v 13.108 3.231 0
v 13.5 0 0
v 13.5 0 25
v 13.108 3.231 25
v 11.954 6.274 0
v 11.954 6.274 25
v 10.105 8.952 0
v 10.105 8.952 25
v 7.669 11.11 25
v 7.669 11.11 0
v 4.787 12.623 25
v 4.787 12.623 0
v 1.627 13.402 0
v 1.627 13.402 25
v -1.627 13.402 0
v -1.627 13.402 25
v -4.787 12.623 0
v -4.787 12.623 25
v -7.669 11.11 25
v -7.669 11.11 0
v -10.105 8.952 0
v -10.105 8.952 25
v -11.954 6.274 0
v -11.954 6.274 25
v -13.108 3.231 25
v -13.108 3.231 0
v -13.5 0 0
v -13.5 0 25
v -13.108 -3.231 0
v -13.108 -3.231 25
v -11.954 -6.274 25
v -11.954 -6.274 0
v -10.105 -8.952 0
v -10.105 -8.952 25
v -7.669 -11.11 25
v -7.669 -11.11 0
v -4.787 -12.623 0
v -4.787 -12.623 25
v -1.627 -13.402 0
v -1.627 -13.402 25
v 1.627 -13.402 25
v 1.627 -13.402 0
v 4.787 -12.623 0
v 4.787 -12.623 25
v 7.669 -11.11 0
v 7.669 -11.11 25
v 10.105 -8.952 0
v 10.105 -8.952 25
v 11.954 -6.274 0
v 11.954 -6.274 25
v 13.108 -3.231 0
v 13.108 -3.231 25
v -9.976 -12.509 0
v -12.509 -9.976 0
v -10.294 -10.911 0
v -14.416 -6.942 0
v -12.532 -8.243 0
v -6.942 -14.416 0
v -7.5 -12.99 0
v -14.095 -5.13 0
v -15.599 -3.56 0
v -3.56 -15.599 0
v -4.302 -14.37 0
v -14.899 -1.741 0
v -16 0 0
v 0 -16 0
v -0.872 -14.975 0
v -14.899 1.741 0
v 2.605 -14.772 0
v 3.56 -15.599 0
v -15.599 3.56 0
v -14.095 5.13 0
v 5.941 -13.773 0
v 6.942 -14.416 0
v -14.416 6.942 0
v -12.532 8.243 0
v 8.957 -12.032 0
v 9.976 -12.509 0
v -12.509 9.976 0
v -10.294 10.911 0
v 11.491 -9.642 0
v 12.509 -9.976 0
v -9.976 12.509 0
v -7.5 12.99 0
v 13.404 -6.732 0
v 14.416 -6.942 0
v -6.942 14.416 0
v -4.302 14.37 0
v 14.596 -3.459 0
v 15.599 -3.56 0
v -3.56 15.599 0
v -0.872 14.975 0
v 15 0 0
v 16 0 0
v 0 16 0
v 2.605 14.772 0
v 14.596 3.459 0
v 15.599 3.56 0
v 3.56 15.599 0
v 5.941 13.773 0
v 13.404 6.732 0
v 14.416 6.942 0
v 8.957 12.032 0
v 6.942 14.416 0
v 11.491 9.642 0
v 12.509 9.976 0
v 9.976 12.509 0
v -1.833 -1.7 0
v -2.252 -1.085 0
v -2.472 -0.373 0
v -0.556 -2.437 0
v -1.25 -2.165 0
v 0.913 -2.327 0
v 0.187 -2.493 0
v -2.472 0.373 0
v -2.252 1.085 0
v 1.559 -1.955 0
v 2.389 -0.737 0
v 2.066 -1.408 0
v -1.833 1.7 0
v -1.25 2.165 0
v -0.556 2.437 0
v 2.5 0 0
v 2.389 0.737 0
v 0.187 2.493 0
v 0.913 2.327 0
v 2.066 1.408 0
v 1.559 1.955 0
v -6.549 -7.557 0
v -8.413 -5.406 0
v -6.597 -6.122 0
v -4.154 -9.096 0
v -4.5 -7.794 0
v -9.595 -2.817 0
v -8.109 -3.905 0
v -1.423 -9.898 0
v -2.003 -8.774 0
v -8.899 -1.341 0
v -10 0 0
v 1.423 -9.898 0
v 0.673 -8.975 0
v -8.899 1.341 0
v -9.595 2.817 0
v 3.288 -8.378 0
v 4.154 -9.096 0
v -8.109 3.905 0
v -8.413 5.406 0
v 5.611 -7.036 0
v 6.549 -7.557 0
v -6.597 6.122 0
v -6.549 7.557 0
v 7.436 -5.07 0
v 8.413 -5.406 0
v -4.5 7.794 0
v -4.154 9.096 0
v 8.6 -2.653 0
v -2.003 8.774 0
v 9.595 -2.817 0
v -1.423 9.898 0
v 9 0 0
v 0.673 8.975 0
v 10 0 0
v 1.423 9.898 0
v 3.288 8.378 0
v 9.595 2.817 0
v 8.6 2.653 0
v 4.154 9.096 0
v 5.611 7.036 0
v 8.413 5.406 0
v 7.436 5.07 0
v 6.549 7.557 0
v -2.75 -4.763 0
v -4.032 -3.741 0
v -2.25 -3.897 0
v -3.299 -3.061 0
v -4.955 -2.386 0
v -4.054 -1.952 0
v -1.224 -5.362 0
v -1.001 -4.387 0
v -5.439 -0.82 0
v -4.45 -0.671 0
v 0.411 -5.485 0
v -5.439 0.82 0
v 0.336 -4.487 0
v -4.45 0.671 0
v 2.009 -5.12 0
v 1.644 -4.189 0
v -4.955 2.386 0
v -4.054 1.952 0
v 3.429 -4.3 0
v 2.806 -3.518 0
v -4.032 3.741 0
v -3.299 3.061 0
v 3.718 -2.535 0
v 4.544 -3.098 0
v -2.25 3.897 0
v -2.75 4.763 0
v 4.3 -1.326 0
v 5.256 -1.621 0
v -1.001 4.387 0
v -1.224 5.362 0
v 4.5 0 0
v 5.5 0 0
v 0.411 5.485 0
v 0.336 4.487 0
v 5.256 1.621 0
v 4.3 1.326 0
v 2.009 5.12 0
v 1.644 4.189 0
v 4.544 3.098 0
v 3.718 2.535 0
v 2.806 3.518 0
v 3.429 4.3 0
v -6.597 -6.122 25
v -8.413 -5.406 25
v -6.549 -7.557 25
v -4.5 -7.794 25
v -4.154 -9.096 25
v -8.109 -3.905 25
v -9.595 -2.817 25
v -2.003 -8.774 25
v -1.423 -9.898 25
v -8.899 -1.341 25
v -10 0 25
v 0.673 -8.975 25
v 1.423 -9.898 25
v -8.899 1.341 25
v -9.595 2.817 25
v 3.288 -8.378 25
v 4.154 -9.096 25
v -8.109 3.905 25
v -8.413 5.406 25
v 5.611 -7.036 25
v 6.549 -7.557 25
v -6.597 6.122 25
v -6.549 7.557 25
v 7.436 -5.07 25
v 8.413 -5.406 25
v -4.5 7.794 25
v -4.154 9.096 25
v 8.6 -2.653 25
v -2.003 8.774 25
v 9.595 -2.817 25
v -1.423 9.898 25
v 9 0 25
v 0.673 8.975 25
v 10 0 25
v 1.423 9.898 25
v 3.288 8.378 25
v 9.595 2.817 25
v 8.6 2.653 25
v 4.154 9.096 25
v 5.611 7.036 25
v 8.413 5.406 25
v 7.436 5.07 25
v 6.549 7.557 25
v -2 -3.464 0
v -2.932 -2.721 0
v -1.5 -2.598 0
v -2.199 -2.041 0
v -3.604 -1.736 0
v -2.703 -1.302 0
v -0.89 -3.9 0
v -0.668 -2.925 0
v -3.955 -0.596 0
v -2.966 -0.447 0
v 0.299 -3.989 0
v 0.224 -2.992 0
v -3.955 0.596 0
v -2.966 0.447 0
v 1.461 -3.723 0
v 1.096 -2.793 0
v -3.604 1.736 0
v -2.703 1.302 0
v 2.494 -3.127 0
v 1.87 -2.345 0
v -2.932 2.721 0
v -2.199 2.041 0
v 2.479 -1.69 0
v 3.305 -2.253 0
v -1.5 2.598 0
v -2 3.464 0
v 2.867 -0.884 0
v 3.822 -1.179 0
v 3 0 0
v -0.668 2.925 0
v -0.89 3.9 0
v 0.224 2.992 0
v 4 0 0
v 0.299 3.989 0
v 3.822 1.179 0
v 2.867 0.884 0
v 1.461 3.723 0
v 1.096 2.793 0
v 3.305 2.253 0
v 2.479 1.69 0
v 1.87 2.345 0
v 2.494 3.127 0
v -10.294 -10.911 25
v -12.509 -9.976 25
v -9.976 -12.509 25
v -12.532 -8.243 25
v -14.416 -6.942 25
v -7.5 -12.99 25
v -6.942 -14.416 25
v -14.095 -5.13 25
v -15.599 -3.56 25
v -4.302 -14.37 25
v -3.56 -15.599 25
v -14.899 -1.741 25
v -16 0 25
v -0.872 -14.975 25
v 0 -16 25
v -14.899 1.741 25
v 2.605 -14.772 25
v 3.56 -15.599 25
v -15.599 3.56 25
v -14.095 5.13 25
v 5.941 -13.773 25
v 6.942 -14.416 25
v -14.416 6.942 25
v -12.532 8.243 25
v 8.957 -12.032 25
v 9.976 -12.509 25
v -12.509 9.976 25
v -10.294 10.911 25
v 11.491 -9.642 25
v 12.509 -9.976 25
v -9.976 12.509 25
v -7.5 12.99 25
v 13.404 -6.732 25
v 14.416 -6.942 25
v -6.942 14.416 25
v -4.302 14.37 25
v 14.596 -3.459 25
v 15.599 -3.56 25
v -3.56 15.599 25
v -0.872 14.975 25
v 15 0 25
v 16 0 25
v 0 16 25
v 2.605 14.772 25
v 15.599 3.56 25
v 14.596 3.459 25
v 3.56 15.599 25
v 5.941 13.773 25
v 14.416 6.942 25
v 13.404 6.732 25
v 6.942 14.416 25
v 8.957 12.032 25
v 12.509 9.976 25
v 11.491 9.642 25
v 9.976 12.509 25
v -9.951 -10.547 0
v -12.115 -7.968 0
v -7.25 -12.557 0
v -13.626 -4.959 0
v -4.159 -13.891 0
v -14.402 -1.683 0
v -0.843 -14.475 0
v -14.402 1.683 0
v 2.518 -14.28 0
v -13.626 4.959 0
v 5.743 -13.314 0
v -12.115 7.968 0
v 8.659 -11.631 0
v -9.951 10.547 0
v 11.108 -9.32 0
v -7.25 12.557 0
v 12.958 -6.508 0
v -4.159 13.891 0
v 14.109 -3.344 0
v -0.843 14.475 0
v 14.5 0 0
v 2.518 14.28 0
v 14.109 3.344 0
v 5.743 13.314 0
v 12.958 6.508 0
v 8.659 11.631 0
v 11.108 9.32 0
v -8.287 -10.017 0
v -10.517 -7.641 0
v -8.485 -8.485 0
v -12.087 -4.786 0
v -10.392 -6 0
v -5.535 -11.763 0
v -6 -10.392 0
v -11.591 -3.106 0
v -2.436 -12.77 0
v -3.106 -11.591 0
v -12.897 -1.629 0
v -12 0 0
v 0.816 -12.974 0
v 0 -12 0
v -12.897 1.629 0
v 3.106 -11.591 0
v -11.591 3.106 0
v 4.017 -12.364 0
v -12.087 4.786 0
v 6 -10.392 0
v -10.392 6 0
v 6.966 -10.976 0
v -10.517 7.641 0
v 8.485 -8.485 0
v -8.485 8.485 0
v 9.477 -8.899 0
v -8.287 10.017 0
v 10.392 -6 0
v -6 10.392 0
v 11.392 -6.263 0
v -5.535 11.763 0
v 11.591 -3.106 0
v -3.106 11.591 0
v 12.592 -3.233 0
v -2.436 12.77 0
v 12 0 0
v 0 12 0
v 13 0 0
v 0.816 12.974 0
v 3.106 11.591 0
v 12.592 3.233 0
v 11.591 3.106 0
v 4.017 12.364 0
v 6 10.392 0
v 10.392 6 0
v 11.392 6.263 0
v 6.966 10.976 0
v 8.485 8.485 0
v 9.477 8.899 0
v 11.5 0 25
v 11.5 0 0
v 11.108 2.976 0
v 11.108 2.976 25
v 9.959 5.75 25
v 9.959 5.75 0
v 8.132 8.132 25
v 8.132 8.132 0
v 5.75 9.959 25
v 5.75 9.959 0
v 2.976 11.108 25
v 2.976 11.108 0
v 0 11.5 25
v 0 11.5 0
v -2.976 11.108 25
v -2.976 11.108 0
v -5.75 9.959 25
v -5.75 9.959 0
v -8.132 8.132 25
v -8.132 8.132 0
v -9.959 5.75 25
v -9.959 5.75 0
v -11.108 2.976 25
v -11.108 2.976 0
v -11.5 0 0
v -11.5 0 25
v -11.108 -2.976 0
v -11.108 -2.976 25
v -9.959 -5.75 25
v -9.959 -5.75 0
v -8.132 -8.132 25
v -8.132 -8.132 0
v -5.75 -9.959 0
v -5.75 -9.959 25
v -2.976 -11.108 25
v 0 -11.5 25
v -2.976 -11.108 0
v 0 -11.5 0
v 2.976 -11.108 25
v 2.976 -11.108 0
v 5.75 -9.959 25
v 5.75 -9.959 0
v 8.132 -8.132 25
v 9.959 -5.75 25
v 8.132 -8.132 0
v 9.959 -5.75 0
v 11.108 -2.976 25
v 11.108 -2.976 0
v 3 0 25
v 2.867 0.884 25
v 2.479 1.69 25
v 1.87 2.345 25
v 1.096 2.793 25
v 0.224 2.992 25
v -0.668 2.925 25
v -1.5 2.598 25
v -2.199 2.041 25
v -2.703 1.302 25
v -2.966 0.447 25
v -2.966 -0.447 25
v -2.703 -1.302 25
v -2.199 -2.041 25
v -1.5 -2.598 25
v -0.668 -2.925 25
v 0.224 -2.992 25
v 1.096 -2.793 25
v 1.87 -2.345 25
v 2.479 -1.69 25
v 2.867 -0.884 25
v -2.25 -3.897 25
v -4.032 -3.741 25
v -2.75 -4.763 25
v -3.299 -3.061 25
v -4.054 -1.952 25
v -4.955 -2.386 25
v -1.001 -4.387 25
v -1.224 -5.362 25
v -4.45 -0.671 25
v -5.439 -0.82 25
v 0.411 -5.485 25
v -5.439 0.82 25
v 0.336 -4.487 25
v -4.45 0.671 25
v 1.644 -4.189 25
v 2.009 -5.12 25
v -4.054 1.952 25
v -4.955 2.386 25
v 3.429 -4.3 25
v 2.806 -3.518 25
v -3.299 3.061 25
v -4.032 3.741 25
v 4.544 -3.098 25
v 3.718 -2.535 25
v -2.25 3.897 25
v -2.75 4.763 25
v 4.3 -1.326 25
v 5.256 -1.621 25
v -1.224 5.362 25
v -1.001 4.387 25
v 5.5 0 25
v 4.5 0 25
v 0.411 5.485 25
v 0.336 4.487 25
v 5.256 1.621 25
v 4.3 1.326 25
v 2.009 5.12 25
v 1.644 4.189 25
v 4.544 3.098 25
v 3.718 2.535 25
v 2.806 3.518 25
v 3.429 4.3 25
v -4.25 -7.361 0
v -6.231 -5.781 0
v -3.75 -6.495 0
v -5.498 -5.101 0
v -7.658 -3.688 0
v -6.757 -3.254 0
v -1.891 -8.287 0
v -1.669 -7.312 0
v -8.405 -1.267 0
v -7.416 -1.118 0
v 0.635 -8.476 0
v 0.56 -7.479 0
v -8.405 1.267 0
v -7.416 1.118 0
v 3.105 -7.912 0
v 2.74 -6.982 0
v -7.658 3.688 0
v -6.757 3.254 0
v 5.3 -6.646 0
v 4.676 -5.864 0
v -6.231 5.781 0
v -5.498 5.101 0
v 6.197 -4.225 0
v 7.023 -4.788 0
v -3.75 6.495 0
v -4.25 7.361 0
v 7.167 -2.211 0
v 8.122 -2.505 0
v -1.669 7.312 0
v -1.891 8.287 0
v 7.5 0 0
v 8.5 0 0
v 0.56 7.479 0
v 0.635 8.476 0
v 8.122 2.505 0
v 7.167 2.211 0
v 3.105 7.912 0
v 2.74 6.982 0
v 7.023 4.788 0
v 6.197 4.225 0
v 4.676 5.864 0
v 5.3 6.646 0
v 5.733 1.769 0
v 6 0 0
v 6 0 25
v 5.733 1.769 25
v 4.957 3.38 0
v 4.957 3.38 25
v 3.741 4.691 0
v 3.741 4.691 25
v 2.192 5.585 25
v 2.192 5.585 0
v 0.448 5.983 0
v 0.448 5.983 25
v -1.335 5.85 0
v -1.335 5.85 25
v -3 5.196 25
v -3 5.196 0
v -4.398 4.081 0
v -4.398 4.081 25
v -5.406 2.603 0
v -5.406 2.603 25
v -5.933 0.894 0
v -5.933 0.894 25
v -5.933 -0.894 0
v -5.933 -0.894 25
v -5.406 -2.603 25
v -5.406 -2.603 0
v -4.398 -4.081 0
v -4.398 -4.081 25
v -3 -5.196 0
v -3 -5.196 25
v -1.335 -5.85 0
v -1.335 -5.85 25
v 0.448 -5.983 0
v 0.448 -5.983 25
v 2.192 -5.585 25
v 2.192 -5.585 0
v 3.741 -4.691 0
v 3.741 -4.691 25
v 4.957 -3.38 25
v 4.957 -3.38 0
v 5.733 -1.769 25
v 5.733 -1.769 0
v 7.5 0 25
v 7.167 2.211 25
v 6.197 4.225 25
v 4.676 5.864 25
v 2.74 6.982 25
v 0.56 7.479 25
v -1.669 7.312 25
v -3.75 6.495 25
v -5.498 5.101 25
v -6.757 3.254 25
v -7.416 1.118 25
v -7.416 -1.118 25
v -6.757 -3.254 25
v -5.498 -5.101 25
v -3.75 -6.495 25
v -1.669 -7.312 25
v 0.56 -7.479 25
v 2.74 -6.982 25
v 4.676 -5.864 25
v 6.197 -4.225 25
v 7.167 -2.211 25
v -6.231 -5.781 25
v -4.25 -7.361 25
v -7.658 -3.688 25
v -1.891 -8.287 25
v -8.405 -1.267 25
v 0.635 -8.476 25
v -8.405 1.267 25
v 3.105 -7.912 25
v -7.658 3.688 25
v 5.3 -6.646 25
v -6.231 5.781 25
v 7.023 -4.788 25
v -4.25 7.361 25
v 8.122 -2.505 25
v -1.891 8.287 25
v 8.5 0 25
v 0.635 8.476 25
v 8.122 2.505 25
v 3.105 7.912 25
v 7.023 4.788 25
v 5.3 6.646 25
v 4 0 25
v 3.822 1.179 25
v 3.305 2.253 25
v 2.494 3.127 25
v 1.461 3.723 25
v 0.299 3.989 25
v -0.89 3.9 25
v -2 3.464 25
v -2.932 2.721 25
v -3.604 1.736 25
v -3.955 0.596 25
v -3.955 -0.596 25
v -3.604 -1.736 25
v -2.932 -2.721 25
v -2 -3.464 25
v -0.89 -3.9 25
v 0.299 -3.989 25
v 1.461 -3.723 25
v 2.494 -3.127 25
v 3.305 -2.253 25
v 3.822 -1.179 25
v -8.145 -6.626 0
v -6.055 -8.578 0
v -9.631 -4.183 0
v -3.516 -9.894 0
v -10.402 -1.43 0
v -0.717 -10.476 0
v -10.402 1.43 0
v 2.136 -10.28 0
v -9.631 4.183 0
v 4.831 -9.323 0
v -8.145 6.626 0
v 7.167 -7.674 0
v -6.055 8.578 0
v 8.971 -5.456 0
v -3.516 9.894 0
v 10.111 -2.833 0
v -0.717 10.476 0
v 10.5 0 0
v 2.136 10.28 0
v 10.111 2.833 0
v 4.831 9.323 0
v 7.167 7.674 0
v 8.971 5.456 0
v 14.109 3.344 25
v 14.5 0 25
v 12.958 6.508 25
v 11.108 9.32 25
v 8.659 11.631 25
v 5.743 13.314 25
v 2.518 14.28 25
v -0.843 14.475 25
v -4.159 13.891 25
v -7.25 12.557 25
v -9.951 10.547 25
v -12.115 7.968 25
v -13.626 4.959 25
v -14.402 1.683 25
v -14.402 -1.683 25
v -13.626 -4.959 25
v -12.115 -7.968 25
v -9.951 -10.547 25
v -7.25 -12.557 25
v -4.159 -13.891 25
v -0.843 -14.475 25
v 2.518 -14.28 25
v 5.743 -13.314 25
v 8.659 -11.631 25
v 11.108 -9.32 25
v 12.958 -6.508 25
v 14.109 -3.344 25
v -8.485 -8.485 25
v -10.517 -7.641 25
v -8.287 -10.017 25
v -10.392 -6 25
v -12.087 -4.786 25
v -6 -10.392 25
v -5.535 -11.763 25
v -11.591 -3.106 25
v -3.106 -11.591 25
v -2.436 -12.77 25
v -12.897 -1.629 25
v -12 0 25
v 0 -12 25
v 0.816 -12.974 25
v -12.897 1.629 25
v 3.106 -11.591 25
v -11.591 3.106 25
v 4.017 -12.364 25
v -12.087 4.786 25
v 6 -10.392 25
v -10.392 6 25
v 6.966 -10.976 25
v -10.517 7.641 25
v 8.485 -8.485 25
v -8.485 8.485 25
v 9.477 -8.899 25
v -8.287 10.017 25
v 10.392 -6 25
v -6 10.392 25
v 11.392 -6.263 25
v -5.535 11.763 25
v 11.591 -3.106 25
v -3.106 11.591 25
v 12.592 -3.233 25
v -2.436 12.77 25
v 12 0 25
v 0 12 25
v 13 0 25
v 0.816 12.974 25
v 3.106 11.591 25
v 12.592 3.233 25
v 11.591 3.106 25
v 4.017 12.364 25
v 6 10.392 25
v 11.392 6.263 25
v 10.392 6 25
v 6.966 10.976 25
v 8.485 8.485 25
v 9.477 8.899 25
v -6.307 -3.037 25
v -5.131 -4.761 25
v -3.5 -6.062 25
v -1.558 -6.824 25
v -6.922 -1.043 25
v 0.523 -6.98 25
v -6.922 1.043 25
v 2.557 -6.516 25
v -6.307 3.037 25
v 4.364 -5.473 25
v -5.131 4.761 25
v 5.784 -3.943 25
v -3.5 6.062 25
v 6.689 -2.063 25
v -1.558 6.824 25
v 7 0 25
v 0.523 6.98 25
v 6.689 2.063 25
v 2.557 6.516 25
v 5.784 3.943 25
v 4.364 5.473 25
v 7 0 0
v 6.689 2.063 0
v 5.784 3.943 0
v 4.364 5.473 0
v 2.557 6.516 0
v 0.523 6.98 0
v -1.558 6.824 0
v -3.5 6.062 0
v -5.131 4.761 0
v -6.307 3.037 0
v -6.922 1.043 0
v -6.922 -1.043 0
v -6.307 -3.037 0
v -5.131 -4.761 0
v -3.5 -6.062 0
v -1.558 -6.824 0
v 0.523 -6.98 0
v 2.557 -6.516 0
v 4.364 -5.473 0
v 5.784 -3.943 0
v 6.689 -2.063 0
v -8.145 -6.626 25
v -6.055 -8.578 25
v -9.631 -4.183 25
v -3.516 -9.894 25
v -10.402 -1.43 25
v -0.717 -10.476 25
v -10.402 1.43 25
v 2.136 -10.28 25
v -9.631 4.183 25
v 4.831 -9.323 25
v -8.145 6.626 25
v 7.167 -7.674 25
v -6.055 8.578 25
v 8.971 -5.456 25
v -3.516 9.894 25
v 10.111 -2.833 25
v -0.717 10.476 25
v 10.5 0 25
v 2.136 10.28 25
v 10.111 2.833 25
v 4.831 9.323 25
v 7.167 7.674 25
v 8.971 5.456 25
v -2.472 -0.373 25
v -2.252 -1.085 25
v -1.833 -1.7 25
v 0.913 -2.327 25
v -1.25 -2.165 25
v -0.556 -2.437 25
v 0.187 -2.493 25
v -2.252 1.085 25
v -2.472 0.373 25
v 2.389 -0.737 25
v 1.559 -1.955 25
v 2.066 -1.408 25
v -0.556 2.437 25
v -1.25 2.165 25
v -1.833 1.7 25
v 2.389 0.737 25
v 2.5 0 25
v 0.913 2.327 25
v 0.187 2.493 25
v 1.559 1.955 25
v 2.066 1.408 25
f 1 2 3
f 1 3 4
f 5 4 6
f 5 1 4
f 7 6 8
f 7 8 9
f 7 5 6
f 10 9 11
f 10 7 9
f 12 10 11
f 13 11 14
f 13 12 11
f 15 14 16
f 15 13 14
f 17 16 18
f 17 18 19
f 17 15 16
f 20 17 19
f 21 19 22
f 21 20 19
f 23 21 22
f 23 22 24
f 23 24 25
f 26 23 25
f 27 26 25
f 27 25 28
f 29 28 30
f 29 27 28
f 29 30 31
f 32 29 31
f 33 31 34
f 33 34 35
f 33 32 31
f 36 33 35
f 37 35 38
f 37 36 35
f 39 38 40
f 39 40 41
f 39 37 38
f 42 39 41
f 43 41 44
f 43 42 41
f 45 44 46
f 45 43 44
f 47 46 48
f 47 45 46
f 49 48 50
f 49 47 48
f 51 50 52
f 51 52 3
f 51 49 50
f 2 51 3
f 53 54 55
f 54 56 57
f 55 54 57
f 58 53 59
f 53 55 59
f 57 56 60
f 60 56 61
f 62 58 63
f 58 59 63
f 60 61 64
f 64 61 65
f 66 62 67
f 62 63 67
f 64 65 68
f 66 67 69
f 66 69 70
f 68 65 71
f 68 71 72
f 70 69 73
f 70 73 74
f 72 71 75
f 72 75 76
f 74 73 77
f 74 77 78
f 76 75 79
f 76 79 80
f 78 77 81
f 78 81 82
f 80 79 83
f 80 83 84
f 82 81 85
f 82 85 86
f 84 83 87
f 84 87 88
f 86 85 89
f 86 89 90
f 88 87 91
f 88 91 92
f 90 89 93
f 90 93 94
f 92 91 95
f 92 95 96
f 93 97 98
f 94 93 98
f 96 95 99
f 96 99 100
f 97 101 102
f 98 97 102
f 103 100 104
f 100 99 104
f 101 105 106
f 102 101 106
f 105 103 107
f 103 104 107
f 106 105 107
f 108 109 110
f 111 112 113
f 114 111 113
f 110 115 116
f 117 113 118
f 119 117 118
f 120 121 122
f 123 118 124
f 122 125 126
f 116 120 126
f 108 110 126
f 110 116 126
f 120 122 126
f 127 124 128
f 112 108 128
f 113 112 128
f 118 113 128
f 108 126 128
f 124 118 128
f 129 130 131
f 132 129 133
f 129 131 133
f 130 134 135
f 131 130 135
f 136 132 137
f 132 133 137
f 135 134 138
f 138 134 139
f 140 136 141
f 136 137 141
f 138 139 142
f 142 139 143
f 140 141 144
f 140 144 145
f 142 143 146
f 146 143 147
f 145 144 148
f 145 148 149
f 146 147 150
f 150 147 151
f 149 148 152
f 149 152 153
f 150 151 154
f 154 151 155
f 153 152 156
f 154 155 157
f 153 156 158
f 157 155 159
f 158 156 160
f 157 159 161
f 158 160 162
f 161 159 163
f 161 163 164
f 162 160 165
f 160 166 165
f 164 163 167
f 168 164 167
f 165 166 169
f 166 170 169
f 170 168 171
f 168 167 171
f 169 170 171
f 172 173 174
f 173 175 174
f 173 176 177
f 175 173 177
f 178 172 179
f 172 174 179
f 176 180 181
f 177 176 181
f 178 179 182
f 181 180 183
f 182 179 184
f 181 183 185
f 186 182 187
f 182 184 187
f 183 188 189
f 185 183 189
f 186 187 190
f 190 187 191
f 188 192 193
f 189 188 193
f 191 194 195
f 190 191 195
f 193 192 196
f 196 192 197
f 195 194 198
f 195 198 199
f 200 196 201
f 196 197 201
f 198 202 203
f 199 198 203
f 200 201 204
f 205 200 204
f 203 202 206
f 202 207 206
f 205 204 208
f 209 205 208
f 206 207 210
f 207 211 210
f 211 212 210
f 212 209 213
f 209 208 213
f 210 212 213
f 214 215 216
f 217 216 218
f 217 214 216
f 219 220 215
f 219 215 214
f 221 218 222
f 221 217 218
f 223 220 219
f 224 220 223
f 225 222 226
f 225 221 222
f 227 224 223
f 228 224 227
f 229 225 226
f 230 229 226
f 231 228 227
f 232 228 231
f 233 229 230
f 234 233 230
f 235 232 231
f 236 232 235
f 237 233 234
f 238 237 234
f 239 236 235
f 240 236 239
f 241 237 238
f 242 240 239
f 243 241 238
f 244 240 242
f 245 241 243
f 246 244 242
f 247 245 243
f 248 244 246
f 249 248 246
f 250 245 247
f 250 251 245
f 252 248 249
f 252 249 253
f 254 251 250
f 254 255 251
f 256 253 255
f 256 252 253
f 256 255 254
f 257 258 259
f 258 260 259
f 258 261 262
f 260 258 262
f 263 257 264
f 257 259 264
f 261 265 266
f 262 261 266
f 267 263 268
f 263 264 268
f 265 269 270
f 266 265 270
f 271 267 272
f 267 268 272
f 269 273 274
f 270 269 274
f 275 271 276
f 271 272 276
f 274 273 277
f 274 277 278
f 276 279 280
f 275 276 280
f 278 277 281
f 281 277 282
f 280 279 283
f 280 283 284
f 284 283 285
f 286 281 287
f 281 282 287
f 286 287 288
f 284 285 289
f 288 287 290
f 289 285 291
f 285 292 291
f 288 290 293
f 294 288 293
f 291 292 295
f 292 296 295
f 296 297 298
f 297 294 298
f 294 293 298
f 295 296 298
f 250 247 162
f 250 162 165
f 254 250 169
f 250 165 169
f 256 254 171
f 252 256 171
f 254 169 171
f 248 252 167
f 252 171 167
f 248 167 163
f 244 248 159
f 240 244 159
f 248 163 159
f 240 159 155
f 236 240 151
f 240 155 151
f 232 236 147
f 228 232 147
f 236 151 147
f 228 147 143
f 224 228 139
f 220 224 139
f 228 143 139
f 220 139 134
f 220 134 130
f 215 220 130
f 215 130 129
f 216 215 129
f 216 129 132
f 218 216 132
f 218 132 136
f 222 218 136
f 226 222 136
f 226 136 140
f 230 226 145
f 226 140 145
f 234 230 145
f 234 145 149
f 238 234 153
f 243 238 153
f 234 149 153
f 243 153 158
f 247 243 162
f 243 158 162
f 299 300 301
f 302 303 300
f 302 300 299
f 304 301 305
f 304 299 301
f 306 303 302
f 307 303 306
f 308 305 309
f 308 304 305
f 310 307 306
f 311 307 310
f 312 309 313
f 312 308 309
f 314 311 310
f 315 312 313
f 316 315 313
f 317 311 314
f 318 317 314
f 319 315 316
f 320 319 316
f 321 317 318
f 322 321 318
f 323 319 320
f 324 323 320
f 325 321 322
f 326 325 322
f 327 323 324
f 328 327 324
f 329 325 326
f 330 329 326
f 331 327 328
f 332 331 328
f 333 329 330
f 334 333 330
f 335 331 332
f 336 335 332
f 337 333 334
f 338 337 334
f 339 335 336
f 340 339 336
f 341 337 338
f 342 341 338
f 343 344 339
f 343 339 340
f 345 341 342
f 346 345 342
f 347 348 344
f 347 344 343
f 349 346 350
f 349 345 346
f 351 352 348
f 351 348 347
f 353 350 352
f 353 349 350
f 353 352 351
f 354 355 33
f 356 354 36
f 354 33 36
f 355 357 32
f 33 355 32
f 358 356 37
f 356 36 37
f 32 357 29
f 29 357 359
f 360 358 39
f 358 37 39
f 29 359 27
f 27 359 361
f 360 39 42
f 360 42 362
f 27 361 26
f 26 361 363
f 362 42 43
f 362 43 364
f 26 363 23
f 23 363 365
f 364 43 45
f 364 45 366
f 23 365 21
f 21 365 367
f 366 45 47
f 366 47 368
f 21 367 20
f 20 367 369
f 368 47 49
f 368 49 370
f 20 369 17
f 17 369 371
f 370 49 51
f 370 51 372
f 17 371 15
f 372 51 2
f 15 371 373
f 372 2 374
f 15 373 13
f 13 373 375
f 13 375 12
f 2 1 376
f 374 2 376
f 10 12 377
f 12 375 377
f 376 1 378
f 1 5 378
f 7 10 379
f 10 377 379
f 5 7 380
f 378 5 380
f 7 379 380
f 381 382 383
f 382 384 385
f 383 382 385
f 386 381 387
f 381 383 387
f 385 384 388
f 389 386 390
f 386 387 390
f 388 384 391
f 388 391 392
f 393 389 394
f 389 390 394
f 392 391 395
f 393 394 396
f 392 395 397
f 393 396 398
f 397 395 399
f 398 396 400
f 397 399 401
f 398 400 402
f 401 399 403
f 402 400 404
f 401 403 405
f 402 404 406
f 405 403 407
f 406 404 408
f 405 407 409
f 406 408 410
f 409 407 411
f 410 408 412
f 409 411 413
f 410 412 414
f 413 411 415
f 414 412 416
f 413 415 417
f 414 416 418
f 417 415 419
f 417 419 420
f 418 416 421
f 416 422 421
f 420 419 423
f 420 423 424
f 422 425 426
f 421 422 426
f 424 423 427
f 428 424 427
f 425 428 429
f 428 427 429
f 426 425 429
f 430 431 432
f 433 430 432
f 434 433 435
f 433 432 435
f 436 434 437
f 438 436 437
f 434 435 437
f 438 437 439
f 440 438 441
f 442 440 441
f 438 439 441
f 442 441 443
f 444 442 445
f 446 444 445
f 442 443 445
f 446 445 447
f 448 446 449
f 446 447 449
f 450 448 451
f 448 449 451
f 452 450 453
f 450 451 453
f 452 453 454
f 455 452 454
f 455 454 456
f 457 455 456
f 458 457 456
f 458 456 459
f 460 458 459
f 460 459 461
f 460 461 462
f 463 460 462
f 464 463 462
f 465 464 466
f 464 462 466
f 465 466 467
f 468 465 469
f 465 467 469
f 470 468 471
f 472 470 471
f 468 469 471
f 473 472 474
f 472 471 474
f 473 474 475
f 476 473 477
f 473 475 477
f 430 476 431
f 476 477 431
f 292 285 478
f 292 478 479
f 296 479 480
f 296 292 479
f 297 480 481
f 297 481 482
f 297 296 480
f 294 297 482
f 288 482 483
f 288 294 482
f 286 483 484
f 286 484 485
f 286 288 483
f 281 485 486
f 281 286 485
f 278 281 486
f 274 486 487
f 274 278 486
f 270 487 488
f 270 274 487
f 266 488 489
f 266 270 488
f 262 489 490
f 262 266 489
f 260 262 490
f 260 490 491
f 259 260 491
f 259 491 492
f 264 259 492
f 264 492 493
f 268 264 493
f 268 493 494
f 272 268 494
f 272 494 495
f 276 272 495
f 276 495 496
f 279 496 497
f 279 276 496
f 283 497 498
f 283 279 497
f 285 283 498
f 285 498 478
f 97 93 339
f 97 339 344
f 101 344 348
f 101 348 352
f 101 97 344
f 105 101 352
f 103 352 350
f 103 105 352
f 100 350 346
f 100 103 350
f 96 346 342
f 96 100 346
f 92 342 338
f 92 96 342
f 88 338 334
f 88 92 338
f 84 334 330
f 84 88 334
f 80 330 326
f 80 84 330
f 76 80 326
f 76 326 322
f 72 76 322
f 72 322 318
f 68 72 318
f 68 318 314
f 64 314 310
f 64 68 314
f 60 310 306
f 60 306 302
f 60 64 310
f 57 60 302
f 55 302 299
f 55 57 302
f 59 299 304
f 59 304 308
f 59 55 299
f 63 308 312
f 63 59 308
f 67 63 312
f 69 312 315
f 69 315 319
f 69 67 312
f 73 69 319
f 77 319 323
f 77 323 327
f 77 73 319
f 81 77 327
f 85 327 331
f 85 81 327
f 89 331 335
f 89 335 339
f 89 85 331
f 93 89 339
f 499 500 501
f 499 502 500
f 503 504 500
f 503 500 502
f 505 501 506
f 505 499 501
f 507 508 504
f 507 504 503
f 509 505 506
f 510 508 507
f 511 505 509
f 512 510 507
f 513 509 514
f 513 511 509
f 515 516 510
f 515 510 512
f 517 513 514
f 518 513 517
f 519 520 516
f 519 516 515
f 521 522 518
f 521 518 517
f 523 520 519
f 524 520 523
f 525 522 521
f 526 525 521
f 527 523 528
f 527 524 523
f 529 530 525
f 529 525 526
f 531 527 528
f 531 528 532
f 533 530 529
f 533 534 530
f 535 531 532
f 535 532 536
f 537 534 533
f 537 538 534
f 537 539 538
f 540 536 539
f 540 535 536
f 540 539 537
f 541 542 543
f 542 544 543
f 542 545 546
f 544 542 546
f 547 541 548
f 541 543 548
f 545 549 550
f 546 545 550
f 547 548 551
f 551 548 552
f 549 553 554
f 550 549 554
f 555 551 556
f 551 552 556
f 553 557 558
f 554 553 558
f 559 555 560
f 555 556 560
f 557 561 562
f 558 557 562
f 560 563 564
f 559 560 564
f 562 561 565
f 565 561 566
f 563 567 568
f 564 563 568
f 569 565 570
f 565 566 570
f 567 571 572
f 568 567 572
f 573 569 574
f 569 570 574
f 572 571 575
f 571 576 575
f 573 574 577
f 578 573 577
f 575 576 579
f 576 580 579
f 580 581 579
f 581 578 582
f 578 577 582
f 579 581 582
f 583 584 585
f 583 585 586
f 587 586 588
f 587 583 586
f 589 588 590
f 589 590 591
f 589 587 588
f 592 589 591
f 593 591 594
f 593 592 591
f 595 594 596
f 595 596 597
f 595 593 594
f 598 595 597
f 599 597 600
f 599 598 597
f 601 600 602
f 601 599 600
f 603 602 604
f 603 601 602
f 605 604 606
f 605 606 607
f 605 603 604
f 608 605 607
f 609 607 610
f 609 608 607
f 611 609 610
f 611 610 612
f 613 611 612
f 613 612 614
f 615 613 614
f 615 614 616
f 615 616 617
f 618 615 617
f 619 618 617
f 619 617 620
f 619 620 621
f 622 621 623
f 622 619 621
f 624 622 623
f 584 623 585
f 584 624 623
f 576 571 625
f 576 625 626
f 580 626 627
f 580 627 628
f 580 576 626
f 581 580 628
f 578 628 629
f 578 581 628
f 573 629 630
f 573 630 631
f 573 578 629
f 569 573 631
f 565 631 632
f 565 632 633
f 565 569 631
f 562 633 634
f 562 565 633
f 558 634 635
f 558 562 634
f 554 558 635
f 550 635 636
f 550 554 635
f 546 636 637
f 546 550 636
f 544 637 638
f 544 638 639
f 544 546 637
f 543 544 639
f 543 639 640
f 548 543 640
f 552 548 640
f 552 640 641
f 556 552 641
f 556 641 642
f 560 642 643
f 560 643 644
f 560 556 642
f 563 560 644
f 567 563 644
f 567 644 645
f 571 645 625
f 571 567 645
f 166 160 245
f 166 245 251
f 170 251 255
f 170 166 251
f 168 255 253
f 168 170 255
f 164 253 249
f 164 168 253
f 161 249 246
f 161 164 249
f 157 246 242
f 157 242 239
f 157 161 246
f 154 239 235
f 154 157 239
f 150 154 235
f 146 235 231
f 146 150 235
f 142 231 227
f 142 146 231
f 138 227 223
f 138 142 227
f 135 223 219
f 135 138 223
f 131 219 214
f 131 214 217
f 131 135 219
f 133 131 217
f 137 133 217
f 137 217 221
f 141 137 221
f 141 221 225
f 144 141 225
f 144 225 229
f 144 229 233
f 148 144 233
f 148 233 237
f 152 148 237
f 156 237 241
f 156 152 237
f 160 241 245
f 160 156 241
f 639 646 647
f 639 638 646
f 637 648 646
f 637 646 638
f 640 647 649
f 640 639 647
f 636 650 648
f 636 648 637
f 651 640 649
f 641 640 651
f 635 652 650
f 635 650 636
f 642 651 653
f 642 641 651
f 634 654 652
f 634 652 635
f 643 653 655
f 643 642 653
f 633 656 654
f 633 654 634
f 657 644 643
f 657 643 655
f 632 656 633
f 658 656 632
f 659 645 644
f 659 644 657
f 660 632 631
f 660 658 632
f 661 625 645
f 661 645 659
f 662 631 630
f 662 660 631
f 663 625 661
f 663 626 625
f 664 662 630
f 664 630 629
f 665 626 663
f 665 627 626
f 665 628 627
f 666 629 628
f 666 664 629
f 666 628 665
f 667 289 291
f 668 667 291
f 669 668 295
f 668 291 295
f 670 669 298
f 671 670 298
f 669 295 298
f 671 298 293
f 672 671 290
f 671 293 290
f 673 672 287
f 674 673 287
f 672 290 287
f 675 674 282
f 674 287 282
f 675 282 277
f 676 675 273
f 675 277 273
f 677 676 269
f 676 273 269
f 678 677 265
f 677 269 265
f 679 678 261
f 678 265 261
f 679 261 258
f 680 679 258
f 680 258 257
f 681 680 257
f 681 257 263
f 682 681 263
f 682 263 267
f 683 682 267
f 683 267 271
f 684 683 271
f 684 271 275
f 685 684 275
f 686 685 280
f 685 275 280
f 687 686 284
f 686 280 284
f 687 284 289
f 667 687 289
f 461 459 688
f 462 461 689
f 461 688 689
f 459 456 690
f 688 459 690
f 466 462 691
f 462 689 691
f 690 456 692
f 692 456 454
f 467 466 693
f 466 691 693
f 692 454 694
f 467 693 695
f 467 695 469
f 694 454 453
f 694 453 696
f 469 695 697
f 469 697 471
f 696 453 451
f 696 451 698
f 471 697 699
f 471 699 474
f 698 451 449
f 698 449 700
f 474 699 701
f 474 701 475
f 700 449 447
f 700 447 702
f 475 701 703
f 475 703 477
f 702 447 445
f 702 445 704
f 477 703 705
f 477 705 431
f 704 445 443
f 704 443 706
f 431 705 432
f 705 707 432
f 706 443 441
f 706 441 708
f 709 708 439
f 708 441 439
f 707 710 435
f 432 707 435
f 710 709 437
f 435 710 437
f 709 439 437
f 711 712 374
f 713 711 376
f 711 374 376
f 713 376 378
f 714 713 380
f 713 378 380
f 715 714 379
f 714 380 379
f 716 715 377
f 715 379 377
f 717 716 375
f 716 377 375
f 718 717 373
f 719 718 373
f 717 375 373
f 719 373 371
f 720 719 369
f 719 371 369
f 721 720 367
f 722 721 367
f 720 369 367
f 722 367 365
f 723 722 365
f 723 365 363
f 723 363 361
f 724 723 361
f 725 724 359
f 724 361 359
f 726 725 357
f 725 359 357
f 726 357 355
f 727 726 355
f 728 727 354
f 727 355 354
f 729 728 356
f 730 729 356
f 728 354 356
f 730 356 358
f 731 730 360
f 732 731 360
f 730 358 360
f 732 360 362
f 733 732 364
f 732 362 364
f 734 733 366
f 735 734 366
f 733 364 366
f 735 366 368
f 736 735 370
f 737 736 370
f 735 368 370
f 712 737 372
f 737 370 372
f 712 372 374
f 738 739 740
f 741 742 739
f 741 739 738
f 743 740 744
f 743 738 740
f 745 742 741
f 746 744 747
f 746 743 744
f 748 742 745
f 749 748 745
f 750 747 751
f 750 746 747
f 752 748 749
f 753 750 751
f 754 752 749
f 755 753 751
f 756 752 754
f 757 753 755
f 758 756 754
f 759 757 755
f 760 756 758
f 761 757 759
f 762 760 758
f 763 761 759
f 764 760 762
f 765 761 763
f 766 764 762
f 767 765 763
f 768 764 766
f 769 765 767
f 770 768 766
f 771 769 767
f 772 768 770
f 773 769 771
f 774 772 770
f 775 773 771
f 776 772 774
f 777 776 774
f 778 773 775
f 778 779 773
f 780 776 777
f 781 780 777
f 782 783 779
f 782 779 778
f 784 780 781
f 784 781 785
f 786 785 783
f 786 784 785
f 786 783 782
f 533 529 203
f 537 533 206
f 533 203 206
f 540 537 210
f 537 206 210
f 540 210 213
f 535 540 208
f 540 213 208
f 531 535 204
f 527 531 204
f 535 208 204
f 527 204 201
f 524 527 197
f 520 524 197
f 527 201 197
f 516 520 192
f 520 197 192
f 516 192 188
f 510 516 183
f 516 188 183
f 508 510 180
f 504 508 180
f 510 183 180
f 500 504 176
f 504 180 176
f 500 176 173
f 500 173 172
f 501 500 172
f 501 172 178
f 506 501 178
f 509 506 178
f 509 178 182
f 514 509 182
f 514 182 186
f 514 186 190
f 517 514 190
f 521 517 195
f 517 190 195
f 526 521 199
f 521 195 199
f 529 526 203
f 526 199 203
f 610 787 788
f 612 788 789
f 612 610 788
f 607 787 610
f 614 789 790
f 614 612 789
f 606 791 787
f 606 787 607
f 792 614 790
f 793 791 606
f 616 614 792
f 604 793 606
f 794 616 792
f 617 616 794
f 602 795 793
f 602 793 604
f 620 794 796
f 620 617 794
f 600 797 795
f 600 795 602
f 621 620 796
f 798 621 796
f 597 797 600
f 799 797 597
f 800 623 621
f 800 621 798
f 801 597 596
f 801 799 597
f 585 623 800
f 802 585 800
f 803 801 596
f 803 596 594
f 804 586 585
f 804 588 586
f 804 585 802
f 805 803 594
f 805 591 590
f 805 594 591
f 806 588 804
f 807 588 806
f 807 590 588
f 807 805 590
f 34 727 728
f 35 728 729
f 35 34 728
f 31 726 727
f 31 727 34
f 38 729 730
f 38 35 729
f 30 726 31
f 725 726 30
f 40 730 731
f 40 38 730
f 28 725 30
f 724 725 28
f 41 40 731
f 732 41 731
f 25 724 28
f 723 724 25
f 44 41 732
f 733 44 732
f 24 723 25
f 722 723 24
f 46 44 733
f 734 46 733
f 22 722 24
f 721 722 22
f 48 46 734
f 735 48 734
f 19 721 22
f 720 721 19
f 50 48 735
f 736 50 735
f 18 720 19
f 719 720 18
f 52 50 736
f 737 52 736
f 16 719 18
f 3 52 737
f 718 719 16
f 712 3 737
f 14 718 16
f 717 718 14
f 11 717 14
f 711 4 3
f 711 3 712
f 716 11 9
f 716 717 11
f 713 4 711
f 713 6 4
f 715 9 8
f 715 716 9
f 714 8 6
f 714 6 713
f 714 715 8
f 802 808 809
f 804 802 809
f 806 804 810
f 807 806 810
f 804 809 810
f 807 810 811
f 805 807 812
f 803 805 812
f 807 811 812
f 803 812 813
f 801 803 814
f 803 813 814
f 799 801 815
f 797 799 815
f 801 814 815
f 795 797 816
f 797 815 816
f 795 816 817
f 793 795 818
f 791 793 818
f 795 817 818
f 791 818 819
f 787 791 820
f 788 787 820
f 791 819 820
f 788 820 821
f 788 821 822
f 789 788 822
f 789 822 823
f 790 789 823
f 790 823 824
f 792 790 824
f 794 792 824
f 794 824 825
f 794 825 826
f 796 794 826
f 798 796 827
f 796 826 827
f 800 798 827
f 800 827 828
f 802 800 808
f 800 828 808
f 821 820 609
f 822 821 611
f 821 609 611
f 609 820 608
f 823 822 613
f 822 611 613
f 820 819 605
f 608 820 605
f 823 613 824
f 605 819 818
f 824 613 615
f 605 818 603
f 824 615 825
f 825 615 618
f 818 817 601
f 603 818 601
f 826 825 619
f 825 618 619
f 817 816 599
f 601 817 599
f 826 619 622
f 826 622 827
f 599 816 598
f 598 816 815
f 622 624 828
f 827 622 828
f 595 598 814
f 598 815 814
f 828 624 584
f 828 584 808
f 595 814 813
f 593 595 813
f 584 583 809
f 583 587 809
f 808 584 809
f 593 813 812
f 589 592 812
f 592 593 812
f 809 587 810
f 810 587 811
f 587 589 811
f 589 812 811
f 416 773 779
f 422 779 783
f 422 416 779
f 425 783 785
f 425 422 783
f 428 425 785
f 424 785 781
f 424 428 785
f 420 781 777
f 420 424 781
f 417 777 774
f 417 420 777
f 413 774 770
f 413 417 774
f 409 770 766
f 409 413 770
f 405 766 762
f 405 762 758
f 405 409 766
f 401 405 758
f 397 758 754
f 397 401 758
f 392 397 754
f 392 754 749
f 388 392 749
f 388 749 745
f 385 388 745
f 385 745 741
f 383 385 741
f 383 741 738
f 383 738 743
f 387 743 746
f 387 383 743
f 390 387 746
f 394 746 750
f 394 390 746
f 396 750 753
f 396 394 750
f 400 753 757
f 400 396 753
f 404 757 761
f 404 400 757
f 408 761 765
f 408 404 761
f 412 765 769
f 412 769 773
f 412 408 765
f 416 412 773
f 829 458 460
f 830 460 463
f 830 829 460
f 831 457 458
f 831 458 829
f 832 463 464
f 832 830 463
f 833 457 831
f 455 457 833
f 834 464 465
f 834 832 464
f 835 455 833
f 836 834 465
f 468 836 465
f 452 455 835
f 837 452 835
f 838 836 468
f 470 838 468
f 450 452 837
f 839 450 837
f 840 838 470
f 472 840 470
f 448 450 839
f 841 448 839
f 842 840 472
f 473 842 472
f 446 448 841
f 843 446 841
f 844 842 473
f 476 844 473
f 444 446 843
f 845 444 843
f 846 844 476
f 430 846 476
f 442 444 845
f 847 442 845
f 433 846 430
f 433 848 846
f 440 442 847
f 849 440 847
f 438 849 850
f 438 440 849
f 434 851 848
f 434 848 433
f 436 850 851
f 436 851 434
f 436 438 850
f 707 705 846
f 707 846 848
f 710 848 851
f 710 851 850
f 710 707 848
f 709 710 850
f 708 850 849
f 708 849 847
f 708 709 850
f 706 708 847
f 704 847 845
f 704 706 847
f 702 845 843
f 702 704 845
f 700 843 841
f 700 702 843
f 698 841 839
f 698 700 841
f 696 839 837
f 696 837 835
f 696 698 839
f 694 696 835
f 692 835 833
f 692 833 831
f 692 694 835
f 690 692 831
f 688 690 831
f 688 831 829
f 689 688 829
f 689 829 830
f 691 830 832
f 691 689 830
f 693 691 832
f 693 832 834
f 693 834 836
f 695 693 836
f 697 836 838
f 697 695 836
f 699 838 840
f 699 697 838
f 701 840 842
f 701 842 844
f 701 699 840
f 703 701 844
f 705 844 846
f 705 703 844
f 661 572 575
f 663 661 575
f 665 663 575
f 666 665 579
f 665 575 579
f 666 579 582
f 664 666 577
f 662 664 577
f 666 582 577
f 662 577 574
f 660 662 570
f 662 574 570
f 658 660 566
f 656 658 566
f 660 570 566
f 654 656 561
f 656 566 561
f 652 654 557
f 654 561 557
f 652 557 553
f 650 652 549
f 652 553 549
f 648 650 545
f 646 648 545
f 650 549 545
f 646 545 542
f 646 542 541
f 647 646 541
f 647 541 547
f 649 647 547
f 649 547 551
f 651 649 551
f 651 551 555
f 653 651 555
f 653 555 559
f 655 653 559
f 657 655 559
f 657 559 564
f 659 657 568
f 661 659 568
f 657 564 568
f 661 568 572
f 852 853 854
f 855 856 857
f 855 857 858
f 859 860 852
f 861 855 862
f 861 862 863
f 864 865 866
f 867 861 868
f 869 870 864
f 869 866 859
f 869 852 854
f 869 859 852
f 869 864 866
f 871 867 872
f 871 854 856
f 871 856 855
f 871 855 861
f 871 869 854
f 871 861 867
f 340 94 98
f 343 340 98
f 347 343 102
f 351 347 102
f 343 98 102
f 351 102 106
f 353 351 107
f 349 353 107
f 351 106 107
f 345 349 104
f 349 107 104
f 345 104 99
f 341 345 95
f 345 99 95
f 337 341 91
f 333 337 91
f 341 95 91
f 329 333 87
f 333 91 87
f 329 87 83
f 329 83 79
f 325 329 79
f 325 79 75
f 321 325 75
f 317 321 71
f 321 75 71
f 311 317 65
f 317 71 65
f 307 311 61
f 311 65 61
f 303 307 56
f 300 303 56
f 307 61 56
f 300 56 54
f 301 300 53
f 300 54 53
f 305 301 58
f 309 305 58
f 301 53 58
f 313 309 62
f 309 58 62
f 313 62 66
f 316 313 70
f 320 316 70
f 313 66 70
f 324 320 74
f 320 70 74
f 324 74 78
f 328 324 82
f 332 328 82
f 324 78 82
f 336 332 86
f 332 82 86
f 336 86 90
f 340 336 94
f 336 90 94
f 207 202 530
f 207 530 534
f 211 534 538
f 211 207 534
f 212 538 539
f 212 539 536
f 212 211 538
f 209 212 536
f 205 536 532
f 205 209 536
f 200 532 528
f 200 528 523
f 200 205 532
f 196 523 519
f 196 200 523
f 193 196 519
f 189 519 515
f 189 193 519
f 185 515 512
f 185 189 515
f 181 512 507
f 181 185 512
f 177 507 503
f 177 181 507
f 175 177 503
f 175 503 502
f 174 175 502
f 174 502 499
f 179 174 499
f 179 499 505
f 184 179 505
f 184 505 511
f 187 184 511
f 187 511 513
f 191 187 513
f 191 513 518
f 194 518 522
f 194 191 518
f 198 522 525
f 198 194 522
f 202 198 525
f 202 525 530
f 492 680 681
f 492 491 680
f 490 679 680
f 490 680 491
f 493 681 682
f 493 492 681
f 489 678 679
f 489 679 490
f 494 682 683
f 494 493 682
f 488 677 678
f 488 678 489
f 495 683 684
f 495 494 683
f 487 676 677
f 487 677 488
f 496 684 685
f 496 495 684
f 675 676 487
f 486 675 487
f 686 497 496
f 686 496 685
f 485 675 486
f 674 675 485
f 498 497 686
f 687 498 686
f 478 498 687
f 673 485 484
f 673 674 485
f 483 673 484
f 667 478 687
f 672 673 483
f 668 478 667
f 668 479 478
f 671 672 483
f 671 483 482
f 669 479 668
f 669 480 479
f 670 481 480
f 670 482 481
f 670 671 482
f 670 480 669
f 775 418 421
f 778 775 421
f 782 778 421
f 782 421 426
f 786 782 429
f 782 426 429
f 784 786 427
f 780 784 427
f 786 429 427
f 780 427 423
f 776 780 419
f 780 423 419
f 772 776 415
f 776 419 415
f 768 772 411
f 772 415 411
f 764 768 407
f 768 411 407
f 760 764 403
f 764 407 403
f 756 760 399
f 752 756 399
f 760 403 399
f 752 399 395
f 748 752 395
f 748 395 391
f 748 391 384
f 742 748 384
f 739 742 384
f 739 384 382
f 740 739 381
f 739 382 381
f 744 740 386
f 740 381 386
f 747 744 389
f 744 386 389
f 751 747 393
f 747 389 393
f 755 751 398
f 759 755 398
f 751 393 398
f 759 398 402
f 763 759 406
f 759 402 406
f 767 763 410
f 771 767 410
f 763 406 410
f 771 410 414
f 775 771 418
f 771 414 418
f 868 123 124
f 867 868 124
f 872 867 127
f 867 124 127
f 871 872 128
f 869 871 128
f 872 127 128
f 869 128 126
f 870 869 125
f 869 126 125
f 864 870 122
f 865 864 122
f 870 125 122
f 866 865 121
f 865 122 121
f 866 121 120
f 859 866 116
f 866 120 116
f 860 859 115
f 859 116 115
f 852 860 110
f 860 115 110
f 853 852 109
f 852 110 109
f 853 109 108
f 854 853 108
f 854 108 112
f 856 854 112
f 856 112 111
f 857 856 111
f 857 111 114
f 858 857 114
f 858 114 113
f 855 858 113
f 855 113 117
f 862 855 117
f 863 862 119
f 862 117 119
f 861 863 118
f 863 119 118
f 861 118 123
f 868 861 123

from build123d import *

# Parameters (mm, degrees)
F0_R     = 2.5
F1_DEPTH = 25
F0_R_2   = 4
F0_R_3   = 3
F0_R_4   = 5.5
F0_R_5   = 4.5
F0_R_6   = 7
F0_R_7   = 6
F0_R_8   = 8.5
F0_R_9   = 7.5
F0_R_10  = 10
F0_R_11  = 9
F0_R_12  = 11.5
F0_R_13  = 10.5
F0_R_14  = 13
F0_R_15  = 12
F0_R_16  = 14.5
F0_R_17  = 13.5
F0_R_18  = 16
F0_R_19  = 15


with BuildPart() as f1:
    # F0 (on Top) → F1 (new body)
    with BuildSketch(Plane.XY):
        Circle(F0_R)
    extrude(amount=F1_DEPTH)


with BuildPart() as f1b:
    # F0 (on Top) → F1, piece 2 (new body)
    with BuildSketch(Plane.XY):
        Circle(F0_R_2)
        Circle(F0_R_3, mode=Mode.SUBTRACT)
    extrude(amount=F1_DEPTH)


with BuildPart() as f1c:
    # F0 (on Top) → F1, piece 3 (new body)
    with BuildSketch(Plane.XY):
        Circle(F0_R_4)
        Circle(F0_R_5, mode=Mode.SUBTRACT)
    extrude(amount=F1_DEPTH)


with BuildPart() as f1d:
    # F0 (on Top) → F1, piece 4 (new body)
    with BuildSketch(Plane.XY):
        Circle(F0_R_6)
        Circle(F0_R_7, mode=Mode.SUBTRACT)
    extrude(amount=F1_DEPTH)


with BuildPart() as f1e:
    # F0 (on Top) → F1, piece 5 (new body)
    with BuildSketch(Plane.XY):
        Circle(F0_R_8)
        Circle(F0_R_9, mode=Mode.SUBTRACT)
    extrude(amount=F1_DEPTH)


with BuildPart() as f1f:
    # F0 (on Top) → F1, piece 6 (new body)
    with BuildSketch(Plane.XY):
        Circle(F0_R_10)
        Circle(F0_R_11, mode=Mode.SUBTRACT)
    extrude(amount=F1_DEPTH)


with BuildPart() as f1g:
    # F0 (on Top) → F1, piece 7 (new body)
    with BuildSketch(Plane.XY):
        Circle(F0_R_12)
        Circle(F0_R_13, mode=Mode.SUBTRACT)
    extrude(amount=F1_DEPTH)


with BuildPart() as f1h:
    # F0 (on Top) → F1, piece 8 (new body)
    with BuildSketch(Plane.XY):
        Circle(F0_R_14)
        Circle(F0_R_15, mode=Mode.SUBTRACT)
    extrude(amount=F1_DEPTH)


with BuildPart() as f1i:
    # F0 (on Top) → F1, piece 9 (new body)
    with BuildSketch(Plane.XY):
        Circle(F0_R_16)
        Circle(F0_R_17, mode=Mode.SUBTRACT)
    extrude(amount=F1_DEPTH)


with BuildPart() as f1j:
    # F0 (on Top) → F1, piece 10 (new body)
    with BuildSketch(Plane.XY):
        Circle(F0_R_18)
        Circle(F0_R_19, mode=Mode.SUBTRACT)
    extrude(amount=F1_DEPTH)


solid = Compound([f1.part, f1b.part, f1c.part, f1d.part, f1e.part, f1f.part, f1g.part, f1h.part, f1i.part, f1j.part])
